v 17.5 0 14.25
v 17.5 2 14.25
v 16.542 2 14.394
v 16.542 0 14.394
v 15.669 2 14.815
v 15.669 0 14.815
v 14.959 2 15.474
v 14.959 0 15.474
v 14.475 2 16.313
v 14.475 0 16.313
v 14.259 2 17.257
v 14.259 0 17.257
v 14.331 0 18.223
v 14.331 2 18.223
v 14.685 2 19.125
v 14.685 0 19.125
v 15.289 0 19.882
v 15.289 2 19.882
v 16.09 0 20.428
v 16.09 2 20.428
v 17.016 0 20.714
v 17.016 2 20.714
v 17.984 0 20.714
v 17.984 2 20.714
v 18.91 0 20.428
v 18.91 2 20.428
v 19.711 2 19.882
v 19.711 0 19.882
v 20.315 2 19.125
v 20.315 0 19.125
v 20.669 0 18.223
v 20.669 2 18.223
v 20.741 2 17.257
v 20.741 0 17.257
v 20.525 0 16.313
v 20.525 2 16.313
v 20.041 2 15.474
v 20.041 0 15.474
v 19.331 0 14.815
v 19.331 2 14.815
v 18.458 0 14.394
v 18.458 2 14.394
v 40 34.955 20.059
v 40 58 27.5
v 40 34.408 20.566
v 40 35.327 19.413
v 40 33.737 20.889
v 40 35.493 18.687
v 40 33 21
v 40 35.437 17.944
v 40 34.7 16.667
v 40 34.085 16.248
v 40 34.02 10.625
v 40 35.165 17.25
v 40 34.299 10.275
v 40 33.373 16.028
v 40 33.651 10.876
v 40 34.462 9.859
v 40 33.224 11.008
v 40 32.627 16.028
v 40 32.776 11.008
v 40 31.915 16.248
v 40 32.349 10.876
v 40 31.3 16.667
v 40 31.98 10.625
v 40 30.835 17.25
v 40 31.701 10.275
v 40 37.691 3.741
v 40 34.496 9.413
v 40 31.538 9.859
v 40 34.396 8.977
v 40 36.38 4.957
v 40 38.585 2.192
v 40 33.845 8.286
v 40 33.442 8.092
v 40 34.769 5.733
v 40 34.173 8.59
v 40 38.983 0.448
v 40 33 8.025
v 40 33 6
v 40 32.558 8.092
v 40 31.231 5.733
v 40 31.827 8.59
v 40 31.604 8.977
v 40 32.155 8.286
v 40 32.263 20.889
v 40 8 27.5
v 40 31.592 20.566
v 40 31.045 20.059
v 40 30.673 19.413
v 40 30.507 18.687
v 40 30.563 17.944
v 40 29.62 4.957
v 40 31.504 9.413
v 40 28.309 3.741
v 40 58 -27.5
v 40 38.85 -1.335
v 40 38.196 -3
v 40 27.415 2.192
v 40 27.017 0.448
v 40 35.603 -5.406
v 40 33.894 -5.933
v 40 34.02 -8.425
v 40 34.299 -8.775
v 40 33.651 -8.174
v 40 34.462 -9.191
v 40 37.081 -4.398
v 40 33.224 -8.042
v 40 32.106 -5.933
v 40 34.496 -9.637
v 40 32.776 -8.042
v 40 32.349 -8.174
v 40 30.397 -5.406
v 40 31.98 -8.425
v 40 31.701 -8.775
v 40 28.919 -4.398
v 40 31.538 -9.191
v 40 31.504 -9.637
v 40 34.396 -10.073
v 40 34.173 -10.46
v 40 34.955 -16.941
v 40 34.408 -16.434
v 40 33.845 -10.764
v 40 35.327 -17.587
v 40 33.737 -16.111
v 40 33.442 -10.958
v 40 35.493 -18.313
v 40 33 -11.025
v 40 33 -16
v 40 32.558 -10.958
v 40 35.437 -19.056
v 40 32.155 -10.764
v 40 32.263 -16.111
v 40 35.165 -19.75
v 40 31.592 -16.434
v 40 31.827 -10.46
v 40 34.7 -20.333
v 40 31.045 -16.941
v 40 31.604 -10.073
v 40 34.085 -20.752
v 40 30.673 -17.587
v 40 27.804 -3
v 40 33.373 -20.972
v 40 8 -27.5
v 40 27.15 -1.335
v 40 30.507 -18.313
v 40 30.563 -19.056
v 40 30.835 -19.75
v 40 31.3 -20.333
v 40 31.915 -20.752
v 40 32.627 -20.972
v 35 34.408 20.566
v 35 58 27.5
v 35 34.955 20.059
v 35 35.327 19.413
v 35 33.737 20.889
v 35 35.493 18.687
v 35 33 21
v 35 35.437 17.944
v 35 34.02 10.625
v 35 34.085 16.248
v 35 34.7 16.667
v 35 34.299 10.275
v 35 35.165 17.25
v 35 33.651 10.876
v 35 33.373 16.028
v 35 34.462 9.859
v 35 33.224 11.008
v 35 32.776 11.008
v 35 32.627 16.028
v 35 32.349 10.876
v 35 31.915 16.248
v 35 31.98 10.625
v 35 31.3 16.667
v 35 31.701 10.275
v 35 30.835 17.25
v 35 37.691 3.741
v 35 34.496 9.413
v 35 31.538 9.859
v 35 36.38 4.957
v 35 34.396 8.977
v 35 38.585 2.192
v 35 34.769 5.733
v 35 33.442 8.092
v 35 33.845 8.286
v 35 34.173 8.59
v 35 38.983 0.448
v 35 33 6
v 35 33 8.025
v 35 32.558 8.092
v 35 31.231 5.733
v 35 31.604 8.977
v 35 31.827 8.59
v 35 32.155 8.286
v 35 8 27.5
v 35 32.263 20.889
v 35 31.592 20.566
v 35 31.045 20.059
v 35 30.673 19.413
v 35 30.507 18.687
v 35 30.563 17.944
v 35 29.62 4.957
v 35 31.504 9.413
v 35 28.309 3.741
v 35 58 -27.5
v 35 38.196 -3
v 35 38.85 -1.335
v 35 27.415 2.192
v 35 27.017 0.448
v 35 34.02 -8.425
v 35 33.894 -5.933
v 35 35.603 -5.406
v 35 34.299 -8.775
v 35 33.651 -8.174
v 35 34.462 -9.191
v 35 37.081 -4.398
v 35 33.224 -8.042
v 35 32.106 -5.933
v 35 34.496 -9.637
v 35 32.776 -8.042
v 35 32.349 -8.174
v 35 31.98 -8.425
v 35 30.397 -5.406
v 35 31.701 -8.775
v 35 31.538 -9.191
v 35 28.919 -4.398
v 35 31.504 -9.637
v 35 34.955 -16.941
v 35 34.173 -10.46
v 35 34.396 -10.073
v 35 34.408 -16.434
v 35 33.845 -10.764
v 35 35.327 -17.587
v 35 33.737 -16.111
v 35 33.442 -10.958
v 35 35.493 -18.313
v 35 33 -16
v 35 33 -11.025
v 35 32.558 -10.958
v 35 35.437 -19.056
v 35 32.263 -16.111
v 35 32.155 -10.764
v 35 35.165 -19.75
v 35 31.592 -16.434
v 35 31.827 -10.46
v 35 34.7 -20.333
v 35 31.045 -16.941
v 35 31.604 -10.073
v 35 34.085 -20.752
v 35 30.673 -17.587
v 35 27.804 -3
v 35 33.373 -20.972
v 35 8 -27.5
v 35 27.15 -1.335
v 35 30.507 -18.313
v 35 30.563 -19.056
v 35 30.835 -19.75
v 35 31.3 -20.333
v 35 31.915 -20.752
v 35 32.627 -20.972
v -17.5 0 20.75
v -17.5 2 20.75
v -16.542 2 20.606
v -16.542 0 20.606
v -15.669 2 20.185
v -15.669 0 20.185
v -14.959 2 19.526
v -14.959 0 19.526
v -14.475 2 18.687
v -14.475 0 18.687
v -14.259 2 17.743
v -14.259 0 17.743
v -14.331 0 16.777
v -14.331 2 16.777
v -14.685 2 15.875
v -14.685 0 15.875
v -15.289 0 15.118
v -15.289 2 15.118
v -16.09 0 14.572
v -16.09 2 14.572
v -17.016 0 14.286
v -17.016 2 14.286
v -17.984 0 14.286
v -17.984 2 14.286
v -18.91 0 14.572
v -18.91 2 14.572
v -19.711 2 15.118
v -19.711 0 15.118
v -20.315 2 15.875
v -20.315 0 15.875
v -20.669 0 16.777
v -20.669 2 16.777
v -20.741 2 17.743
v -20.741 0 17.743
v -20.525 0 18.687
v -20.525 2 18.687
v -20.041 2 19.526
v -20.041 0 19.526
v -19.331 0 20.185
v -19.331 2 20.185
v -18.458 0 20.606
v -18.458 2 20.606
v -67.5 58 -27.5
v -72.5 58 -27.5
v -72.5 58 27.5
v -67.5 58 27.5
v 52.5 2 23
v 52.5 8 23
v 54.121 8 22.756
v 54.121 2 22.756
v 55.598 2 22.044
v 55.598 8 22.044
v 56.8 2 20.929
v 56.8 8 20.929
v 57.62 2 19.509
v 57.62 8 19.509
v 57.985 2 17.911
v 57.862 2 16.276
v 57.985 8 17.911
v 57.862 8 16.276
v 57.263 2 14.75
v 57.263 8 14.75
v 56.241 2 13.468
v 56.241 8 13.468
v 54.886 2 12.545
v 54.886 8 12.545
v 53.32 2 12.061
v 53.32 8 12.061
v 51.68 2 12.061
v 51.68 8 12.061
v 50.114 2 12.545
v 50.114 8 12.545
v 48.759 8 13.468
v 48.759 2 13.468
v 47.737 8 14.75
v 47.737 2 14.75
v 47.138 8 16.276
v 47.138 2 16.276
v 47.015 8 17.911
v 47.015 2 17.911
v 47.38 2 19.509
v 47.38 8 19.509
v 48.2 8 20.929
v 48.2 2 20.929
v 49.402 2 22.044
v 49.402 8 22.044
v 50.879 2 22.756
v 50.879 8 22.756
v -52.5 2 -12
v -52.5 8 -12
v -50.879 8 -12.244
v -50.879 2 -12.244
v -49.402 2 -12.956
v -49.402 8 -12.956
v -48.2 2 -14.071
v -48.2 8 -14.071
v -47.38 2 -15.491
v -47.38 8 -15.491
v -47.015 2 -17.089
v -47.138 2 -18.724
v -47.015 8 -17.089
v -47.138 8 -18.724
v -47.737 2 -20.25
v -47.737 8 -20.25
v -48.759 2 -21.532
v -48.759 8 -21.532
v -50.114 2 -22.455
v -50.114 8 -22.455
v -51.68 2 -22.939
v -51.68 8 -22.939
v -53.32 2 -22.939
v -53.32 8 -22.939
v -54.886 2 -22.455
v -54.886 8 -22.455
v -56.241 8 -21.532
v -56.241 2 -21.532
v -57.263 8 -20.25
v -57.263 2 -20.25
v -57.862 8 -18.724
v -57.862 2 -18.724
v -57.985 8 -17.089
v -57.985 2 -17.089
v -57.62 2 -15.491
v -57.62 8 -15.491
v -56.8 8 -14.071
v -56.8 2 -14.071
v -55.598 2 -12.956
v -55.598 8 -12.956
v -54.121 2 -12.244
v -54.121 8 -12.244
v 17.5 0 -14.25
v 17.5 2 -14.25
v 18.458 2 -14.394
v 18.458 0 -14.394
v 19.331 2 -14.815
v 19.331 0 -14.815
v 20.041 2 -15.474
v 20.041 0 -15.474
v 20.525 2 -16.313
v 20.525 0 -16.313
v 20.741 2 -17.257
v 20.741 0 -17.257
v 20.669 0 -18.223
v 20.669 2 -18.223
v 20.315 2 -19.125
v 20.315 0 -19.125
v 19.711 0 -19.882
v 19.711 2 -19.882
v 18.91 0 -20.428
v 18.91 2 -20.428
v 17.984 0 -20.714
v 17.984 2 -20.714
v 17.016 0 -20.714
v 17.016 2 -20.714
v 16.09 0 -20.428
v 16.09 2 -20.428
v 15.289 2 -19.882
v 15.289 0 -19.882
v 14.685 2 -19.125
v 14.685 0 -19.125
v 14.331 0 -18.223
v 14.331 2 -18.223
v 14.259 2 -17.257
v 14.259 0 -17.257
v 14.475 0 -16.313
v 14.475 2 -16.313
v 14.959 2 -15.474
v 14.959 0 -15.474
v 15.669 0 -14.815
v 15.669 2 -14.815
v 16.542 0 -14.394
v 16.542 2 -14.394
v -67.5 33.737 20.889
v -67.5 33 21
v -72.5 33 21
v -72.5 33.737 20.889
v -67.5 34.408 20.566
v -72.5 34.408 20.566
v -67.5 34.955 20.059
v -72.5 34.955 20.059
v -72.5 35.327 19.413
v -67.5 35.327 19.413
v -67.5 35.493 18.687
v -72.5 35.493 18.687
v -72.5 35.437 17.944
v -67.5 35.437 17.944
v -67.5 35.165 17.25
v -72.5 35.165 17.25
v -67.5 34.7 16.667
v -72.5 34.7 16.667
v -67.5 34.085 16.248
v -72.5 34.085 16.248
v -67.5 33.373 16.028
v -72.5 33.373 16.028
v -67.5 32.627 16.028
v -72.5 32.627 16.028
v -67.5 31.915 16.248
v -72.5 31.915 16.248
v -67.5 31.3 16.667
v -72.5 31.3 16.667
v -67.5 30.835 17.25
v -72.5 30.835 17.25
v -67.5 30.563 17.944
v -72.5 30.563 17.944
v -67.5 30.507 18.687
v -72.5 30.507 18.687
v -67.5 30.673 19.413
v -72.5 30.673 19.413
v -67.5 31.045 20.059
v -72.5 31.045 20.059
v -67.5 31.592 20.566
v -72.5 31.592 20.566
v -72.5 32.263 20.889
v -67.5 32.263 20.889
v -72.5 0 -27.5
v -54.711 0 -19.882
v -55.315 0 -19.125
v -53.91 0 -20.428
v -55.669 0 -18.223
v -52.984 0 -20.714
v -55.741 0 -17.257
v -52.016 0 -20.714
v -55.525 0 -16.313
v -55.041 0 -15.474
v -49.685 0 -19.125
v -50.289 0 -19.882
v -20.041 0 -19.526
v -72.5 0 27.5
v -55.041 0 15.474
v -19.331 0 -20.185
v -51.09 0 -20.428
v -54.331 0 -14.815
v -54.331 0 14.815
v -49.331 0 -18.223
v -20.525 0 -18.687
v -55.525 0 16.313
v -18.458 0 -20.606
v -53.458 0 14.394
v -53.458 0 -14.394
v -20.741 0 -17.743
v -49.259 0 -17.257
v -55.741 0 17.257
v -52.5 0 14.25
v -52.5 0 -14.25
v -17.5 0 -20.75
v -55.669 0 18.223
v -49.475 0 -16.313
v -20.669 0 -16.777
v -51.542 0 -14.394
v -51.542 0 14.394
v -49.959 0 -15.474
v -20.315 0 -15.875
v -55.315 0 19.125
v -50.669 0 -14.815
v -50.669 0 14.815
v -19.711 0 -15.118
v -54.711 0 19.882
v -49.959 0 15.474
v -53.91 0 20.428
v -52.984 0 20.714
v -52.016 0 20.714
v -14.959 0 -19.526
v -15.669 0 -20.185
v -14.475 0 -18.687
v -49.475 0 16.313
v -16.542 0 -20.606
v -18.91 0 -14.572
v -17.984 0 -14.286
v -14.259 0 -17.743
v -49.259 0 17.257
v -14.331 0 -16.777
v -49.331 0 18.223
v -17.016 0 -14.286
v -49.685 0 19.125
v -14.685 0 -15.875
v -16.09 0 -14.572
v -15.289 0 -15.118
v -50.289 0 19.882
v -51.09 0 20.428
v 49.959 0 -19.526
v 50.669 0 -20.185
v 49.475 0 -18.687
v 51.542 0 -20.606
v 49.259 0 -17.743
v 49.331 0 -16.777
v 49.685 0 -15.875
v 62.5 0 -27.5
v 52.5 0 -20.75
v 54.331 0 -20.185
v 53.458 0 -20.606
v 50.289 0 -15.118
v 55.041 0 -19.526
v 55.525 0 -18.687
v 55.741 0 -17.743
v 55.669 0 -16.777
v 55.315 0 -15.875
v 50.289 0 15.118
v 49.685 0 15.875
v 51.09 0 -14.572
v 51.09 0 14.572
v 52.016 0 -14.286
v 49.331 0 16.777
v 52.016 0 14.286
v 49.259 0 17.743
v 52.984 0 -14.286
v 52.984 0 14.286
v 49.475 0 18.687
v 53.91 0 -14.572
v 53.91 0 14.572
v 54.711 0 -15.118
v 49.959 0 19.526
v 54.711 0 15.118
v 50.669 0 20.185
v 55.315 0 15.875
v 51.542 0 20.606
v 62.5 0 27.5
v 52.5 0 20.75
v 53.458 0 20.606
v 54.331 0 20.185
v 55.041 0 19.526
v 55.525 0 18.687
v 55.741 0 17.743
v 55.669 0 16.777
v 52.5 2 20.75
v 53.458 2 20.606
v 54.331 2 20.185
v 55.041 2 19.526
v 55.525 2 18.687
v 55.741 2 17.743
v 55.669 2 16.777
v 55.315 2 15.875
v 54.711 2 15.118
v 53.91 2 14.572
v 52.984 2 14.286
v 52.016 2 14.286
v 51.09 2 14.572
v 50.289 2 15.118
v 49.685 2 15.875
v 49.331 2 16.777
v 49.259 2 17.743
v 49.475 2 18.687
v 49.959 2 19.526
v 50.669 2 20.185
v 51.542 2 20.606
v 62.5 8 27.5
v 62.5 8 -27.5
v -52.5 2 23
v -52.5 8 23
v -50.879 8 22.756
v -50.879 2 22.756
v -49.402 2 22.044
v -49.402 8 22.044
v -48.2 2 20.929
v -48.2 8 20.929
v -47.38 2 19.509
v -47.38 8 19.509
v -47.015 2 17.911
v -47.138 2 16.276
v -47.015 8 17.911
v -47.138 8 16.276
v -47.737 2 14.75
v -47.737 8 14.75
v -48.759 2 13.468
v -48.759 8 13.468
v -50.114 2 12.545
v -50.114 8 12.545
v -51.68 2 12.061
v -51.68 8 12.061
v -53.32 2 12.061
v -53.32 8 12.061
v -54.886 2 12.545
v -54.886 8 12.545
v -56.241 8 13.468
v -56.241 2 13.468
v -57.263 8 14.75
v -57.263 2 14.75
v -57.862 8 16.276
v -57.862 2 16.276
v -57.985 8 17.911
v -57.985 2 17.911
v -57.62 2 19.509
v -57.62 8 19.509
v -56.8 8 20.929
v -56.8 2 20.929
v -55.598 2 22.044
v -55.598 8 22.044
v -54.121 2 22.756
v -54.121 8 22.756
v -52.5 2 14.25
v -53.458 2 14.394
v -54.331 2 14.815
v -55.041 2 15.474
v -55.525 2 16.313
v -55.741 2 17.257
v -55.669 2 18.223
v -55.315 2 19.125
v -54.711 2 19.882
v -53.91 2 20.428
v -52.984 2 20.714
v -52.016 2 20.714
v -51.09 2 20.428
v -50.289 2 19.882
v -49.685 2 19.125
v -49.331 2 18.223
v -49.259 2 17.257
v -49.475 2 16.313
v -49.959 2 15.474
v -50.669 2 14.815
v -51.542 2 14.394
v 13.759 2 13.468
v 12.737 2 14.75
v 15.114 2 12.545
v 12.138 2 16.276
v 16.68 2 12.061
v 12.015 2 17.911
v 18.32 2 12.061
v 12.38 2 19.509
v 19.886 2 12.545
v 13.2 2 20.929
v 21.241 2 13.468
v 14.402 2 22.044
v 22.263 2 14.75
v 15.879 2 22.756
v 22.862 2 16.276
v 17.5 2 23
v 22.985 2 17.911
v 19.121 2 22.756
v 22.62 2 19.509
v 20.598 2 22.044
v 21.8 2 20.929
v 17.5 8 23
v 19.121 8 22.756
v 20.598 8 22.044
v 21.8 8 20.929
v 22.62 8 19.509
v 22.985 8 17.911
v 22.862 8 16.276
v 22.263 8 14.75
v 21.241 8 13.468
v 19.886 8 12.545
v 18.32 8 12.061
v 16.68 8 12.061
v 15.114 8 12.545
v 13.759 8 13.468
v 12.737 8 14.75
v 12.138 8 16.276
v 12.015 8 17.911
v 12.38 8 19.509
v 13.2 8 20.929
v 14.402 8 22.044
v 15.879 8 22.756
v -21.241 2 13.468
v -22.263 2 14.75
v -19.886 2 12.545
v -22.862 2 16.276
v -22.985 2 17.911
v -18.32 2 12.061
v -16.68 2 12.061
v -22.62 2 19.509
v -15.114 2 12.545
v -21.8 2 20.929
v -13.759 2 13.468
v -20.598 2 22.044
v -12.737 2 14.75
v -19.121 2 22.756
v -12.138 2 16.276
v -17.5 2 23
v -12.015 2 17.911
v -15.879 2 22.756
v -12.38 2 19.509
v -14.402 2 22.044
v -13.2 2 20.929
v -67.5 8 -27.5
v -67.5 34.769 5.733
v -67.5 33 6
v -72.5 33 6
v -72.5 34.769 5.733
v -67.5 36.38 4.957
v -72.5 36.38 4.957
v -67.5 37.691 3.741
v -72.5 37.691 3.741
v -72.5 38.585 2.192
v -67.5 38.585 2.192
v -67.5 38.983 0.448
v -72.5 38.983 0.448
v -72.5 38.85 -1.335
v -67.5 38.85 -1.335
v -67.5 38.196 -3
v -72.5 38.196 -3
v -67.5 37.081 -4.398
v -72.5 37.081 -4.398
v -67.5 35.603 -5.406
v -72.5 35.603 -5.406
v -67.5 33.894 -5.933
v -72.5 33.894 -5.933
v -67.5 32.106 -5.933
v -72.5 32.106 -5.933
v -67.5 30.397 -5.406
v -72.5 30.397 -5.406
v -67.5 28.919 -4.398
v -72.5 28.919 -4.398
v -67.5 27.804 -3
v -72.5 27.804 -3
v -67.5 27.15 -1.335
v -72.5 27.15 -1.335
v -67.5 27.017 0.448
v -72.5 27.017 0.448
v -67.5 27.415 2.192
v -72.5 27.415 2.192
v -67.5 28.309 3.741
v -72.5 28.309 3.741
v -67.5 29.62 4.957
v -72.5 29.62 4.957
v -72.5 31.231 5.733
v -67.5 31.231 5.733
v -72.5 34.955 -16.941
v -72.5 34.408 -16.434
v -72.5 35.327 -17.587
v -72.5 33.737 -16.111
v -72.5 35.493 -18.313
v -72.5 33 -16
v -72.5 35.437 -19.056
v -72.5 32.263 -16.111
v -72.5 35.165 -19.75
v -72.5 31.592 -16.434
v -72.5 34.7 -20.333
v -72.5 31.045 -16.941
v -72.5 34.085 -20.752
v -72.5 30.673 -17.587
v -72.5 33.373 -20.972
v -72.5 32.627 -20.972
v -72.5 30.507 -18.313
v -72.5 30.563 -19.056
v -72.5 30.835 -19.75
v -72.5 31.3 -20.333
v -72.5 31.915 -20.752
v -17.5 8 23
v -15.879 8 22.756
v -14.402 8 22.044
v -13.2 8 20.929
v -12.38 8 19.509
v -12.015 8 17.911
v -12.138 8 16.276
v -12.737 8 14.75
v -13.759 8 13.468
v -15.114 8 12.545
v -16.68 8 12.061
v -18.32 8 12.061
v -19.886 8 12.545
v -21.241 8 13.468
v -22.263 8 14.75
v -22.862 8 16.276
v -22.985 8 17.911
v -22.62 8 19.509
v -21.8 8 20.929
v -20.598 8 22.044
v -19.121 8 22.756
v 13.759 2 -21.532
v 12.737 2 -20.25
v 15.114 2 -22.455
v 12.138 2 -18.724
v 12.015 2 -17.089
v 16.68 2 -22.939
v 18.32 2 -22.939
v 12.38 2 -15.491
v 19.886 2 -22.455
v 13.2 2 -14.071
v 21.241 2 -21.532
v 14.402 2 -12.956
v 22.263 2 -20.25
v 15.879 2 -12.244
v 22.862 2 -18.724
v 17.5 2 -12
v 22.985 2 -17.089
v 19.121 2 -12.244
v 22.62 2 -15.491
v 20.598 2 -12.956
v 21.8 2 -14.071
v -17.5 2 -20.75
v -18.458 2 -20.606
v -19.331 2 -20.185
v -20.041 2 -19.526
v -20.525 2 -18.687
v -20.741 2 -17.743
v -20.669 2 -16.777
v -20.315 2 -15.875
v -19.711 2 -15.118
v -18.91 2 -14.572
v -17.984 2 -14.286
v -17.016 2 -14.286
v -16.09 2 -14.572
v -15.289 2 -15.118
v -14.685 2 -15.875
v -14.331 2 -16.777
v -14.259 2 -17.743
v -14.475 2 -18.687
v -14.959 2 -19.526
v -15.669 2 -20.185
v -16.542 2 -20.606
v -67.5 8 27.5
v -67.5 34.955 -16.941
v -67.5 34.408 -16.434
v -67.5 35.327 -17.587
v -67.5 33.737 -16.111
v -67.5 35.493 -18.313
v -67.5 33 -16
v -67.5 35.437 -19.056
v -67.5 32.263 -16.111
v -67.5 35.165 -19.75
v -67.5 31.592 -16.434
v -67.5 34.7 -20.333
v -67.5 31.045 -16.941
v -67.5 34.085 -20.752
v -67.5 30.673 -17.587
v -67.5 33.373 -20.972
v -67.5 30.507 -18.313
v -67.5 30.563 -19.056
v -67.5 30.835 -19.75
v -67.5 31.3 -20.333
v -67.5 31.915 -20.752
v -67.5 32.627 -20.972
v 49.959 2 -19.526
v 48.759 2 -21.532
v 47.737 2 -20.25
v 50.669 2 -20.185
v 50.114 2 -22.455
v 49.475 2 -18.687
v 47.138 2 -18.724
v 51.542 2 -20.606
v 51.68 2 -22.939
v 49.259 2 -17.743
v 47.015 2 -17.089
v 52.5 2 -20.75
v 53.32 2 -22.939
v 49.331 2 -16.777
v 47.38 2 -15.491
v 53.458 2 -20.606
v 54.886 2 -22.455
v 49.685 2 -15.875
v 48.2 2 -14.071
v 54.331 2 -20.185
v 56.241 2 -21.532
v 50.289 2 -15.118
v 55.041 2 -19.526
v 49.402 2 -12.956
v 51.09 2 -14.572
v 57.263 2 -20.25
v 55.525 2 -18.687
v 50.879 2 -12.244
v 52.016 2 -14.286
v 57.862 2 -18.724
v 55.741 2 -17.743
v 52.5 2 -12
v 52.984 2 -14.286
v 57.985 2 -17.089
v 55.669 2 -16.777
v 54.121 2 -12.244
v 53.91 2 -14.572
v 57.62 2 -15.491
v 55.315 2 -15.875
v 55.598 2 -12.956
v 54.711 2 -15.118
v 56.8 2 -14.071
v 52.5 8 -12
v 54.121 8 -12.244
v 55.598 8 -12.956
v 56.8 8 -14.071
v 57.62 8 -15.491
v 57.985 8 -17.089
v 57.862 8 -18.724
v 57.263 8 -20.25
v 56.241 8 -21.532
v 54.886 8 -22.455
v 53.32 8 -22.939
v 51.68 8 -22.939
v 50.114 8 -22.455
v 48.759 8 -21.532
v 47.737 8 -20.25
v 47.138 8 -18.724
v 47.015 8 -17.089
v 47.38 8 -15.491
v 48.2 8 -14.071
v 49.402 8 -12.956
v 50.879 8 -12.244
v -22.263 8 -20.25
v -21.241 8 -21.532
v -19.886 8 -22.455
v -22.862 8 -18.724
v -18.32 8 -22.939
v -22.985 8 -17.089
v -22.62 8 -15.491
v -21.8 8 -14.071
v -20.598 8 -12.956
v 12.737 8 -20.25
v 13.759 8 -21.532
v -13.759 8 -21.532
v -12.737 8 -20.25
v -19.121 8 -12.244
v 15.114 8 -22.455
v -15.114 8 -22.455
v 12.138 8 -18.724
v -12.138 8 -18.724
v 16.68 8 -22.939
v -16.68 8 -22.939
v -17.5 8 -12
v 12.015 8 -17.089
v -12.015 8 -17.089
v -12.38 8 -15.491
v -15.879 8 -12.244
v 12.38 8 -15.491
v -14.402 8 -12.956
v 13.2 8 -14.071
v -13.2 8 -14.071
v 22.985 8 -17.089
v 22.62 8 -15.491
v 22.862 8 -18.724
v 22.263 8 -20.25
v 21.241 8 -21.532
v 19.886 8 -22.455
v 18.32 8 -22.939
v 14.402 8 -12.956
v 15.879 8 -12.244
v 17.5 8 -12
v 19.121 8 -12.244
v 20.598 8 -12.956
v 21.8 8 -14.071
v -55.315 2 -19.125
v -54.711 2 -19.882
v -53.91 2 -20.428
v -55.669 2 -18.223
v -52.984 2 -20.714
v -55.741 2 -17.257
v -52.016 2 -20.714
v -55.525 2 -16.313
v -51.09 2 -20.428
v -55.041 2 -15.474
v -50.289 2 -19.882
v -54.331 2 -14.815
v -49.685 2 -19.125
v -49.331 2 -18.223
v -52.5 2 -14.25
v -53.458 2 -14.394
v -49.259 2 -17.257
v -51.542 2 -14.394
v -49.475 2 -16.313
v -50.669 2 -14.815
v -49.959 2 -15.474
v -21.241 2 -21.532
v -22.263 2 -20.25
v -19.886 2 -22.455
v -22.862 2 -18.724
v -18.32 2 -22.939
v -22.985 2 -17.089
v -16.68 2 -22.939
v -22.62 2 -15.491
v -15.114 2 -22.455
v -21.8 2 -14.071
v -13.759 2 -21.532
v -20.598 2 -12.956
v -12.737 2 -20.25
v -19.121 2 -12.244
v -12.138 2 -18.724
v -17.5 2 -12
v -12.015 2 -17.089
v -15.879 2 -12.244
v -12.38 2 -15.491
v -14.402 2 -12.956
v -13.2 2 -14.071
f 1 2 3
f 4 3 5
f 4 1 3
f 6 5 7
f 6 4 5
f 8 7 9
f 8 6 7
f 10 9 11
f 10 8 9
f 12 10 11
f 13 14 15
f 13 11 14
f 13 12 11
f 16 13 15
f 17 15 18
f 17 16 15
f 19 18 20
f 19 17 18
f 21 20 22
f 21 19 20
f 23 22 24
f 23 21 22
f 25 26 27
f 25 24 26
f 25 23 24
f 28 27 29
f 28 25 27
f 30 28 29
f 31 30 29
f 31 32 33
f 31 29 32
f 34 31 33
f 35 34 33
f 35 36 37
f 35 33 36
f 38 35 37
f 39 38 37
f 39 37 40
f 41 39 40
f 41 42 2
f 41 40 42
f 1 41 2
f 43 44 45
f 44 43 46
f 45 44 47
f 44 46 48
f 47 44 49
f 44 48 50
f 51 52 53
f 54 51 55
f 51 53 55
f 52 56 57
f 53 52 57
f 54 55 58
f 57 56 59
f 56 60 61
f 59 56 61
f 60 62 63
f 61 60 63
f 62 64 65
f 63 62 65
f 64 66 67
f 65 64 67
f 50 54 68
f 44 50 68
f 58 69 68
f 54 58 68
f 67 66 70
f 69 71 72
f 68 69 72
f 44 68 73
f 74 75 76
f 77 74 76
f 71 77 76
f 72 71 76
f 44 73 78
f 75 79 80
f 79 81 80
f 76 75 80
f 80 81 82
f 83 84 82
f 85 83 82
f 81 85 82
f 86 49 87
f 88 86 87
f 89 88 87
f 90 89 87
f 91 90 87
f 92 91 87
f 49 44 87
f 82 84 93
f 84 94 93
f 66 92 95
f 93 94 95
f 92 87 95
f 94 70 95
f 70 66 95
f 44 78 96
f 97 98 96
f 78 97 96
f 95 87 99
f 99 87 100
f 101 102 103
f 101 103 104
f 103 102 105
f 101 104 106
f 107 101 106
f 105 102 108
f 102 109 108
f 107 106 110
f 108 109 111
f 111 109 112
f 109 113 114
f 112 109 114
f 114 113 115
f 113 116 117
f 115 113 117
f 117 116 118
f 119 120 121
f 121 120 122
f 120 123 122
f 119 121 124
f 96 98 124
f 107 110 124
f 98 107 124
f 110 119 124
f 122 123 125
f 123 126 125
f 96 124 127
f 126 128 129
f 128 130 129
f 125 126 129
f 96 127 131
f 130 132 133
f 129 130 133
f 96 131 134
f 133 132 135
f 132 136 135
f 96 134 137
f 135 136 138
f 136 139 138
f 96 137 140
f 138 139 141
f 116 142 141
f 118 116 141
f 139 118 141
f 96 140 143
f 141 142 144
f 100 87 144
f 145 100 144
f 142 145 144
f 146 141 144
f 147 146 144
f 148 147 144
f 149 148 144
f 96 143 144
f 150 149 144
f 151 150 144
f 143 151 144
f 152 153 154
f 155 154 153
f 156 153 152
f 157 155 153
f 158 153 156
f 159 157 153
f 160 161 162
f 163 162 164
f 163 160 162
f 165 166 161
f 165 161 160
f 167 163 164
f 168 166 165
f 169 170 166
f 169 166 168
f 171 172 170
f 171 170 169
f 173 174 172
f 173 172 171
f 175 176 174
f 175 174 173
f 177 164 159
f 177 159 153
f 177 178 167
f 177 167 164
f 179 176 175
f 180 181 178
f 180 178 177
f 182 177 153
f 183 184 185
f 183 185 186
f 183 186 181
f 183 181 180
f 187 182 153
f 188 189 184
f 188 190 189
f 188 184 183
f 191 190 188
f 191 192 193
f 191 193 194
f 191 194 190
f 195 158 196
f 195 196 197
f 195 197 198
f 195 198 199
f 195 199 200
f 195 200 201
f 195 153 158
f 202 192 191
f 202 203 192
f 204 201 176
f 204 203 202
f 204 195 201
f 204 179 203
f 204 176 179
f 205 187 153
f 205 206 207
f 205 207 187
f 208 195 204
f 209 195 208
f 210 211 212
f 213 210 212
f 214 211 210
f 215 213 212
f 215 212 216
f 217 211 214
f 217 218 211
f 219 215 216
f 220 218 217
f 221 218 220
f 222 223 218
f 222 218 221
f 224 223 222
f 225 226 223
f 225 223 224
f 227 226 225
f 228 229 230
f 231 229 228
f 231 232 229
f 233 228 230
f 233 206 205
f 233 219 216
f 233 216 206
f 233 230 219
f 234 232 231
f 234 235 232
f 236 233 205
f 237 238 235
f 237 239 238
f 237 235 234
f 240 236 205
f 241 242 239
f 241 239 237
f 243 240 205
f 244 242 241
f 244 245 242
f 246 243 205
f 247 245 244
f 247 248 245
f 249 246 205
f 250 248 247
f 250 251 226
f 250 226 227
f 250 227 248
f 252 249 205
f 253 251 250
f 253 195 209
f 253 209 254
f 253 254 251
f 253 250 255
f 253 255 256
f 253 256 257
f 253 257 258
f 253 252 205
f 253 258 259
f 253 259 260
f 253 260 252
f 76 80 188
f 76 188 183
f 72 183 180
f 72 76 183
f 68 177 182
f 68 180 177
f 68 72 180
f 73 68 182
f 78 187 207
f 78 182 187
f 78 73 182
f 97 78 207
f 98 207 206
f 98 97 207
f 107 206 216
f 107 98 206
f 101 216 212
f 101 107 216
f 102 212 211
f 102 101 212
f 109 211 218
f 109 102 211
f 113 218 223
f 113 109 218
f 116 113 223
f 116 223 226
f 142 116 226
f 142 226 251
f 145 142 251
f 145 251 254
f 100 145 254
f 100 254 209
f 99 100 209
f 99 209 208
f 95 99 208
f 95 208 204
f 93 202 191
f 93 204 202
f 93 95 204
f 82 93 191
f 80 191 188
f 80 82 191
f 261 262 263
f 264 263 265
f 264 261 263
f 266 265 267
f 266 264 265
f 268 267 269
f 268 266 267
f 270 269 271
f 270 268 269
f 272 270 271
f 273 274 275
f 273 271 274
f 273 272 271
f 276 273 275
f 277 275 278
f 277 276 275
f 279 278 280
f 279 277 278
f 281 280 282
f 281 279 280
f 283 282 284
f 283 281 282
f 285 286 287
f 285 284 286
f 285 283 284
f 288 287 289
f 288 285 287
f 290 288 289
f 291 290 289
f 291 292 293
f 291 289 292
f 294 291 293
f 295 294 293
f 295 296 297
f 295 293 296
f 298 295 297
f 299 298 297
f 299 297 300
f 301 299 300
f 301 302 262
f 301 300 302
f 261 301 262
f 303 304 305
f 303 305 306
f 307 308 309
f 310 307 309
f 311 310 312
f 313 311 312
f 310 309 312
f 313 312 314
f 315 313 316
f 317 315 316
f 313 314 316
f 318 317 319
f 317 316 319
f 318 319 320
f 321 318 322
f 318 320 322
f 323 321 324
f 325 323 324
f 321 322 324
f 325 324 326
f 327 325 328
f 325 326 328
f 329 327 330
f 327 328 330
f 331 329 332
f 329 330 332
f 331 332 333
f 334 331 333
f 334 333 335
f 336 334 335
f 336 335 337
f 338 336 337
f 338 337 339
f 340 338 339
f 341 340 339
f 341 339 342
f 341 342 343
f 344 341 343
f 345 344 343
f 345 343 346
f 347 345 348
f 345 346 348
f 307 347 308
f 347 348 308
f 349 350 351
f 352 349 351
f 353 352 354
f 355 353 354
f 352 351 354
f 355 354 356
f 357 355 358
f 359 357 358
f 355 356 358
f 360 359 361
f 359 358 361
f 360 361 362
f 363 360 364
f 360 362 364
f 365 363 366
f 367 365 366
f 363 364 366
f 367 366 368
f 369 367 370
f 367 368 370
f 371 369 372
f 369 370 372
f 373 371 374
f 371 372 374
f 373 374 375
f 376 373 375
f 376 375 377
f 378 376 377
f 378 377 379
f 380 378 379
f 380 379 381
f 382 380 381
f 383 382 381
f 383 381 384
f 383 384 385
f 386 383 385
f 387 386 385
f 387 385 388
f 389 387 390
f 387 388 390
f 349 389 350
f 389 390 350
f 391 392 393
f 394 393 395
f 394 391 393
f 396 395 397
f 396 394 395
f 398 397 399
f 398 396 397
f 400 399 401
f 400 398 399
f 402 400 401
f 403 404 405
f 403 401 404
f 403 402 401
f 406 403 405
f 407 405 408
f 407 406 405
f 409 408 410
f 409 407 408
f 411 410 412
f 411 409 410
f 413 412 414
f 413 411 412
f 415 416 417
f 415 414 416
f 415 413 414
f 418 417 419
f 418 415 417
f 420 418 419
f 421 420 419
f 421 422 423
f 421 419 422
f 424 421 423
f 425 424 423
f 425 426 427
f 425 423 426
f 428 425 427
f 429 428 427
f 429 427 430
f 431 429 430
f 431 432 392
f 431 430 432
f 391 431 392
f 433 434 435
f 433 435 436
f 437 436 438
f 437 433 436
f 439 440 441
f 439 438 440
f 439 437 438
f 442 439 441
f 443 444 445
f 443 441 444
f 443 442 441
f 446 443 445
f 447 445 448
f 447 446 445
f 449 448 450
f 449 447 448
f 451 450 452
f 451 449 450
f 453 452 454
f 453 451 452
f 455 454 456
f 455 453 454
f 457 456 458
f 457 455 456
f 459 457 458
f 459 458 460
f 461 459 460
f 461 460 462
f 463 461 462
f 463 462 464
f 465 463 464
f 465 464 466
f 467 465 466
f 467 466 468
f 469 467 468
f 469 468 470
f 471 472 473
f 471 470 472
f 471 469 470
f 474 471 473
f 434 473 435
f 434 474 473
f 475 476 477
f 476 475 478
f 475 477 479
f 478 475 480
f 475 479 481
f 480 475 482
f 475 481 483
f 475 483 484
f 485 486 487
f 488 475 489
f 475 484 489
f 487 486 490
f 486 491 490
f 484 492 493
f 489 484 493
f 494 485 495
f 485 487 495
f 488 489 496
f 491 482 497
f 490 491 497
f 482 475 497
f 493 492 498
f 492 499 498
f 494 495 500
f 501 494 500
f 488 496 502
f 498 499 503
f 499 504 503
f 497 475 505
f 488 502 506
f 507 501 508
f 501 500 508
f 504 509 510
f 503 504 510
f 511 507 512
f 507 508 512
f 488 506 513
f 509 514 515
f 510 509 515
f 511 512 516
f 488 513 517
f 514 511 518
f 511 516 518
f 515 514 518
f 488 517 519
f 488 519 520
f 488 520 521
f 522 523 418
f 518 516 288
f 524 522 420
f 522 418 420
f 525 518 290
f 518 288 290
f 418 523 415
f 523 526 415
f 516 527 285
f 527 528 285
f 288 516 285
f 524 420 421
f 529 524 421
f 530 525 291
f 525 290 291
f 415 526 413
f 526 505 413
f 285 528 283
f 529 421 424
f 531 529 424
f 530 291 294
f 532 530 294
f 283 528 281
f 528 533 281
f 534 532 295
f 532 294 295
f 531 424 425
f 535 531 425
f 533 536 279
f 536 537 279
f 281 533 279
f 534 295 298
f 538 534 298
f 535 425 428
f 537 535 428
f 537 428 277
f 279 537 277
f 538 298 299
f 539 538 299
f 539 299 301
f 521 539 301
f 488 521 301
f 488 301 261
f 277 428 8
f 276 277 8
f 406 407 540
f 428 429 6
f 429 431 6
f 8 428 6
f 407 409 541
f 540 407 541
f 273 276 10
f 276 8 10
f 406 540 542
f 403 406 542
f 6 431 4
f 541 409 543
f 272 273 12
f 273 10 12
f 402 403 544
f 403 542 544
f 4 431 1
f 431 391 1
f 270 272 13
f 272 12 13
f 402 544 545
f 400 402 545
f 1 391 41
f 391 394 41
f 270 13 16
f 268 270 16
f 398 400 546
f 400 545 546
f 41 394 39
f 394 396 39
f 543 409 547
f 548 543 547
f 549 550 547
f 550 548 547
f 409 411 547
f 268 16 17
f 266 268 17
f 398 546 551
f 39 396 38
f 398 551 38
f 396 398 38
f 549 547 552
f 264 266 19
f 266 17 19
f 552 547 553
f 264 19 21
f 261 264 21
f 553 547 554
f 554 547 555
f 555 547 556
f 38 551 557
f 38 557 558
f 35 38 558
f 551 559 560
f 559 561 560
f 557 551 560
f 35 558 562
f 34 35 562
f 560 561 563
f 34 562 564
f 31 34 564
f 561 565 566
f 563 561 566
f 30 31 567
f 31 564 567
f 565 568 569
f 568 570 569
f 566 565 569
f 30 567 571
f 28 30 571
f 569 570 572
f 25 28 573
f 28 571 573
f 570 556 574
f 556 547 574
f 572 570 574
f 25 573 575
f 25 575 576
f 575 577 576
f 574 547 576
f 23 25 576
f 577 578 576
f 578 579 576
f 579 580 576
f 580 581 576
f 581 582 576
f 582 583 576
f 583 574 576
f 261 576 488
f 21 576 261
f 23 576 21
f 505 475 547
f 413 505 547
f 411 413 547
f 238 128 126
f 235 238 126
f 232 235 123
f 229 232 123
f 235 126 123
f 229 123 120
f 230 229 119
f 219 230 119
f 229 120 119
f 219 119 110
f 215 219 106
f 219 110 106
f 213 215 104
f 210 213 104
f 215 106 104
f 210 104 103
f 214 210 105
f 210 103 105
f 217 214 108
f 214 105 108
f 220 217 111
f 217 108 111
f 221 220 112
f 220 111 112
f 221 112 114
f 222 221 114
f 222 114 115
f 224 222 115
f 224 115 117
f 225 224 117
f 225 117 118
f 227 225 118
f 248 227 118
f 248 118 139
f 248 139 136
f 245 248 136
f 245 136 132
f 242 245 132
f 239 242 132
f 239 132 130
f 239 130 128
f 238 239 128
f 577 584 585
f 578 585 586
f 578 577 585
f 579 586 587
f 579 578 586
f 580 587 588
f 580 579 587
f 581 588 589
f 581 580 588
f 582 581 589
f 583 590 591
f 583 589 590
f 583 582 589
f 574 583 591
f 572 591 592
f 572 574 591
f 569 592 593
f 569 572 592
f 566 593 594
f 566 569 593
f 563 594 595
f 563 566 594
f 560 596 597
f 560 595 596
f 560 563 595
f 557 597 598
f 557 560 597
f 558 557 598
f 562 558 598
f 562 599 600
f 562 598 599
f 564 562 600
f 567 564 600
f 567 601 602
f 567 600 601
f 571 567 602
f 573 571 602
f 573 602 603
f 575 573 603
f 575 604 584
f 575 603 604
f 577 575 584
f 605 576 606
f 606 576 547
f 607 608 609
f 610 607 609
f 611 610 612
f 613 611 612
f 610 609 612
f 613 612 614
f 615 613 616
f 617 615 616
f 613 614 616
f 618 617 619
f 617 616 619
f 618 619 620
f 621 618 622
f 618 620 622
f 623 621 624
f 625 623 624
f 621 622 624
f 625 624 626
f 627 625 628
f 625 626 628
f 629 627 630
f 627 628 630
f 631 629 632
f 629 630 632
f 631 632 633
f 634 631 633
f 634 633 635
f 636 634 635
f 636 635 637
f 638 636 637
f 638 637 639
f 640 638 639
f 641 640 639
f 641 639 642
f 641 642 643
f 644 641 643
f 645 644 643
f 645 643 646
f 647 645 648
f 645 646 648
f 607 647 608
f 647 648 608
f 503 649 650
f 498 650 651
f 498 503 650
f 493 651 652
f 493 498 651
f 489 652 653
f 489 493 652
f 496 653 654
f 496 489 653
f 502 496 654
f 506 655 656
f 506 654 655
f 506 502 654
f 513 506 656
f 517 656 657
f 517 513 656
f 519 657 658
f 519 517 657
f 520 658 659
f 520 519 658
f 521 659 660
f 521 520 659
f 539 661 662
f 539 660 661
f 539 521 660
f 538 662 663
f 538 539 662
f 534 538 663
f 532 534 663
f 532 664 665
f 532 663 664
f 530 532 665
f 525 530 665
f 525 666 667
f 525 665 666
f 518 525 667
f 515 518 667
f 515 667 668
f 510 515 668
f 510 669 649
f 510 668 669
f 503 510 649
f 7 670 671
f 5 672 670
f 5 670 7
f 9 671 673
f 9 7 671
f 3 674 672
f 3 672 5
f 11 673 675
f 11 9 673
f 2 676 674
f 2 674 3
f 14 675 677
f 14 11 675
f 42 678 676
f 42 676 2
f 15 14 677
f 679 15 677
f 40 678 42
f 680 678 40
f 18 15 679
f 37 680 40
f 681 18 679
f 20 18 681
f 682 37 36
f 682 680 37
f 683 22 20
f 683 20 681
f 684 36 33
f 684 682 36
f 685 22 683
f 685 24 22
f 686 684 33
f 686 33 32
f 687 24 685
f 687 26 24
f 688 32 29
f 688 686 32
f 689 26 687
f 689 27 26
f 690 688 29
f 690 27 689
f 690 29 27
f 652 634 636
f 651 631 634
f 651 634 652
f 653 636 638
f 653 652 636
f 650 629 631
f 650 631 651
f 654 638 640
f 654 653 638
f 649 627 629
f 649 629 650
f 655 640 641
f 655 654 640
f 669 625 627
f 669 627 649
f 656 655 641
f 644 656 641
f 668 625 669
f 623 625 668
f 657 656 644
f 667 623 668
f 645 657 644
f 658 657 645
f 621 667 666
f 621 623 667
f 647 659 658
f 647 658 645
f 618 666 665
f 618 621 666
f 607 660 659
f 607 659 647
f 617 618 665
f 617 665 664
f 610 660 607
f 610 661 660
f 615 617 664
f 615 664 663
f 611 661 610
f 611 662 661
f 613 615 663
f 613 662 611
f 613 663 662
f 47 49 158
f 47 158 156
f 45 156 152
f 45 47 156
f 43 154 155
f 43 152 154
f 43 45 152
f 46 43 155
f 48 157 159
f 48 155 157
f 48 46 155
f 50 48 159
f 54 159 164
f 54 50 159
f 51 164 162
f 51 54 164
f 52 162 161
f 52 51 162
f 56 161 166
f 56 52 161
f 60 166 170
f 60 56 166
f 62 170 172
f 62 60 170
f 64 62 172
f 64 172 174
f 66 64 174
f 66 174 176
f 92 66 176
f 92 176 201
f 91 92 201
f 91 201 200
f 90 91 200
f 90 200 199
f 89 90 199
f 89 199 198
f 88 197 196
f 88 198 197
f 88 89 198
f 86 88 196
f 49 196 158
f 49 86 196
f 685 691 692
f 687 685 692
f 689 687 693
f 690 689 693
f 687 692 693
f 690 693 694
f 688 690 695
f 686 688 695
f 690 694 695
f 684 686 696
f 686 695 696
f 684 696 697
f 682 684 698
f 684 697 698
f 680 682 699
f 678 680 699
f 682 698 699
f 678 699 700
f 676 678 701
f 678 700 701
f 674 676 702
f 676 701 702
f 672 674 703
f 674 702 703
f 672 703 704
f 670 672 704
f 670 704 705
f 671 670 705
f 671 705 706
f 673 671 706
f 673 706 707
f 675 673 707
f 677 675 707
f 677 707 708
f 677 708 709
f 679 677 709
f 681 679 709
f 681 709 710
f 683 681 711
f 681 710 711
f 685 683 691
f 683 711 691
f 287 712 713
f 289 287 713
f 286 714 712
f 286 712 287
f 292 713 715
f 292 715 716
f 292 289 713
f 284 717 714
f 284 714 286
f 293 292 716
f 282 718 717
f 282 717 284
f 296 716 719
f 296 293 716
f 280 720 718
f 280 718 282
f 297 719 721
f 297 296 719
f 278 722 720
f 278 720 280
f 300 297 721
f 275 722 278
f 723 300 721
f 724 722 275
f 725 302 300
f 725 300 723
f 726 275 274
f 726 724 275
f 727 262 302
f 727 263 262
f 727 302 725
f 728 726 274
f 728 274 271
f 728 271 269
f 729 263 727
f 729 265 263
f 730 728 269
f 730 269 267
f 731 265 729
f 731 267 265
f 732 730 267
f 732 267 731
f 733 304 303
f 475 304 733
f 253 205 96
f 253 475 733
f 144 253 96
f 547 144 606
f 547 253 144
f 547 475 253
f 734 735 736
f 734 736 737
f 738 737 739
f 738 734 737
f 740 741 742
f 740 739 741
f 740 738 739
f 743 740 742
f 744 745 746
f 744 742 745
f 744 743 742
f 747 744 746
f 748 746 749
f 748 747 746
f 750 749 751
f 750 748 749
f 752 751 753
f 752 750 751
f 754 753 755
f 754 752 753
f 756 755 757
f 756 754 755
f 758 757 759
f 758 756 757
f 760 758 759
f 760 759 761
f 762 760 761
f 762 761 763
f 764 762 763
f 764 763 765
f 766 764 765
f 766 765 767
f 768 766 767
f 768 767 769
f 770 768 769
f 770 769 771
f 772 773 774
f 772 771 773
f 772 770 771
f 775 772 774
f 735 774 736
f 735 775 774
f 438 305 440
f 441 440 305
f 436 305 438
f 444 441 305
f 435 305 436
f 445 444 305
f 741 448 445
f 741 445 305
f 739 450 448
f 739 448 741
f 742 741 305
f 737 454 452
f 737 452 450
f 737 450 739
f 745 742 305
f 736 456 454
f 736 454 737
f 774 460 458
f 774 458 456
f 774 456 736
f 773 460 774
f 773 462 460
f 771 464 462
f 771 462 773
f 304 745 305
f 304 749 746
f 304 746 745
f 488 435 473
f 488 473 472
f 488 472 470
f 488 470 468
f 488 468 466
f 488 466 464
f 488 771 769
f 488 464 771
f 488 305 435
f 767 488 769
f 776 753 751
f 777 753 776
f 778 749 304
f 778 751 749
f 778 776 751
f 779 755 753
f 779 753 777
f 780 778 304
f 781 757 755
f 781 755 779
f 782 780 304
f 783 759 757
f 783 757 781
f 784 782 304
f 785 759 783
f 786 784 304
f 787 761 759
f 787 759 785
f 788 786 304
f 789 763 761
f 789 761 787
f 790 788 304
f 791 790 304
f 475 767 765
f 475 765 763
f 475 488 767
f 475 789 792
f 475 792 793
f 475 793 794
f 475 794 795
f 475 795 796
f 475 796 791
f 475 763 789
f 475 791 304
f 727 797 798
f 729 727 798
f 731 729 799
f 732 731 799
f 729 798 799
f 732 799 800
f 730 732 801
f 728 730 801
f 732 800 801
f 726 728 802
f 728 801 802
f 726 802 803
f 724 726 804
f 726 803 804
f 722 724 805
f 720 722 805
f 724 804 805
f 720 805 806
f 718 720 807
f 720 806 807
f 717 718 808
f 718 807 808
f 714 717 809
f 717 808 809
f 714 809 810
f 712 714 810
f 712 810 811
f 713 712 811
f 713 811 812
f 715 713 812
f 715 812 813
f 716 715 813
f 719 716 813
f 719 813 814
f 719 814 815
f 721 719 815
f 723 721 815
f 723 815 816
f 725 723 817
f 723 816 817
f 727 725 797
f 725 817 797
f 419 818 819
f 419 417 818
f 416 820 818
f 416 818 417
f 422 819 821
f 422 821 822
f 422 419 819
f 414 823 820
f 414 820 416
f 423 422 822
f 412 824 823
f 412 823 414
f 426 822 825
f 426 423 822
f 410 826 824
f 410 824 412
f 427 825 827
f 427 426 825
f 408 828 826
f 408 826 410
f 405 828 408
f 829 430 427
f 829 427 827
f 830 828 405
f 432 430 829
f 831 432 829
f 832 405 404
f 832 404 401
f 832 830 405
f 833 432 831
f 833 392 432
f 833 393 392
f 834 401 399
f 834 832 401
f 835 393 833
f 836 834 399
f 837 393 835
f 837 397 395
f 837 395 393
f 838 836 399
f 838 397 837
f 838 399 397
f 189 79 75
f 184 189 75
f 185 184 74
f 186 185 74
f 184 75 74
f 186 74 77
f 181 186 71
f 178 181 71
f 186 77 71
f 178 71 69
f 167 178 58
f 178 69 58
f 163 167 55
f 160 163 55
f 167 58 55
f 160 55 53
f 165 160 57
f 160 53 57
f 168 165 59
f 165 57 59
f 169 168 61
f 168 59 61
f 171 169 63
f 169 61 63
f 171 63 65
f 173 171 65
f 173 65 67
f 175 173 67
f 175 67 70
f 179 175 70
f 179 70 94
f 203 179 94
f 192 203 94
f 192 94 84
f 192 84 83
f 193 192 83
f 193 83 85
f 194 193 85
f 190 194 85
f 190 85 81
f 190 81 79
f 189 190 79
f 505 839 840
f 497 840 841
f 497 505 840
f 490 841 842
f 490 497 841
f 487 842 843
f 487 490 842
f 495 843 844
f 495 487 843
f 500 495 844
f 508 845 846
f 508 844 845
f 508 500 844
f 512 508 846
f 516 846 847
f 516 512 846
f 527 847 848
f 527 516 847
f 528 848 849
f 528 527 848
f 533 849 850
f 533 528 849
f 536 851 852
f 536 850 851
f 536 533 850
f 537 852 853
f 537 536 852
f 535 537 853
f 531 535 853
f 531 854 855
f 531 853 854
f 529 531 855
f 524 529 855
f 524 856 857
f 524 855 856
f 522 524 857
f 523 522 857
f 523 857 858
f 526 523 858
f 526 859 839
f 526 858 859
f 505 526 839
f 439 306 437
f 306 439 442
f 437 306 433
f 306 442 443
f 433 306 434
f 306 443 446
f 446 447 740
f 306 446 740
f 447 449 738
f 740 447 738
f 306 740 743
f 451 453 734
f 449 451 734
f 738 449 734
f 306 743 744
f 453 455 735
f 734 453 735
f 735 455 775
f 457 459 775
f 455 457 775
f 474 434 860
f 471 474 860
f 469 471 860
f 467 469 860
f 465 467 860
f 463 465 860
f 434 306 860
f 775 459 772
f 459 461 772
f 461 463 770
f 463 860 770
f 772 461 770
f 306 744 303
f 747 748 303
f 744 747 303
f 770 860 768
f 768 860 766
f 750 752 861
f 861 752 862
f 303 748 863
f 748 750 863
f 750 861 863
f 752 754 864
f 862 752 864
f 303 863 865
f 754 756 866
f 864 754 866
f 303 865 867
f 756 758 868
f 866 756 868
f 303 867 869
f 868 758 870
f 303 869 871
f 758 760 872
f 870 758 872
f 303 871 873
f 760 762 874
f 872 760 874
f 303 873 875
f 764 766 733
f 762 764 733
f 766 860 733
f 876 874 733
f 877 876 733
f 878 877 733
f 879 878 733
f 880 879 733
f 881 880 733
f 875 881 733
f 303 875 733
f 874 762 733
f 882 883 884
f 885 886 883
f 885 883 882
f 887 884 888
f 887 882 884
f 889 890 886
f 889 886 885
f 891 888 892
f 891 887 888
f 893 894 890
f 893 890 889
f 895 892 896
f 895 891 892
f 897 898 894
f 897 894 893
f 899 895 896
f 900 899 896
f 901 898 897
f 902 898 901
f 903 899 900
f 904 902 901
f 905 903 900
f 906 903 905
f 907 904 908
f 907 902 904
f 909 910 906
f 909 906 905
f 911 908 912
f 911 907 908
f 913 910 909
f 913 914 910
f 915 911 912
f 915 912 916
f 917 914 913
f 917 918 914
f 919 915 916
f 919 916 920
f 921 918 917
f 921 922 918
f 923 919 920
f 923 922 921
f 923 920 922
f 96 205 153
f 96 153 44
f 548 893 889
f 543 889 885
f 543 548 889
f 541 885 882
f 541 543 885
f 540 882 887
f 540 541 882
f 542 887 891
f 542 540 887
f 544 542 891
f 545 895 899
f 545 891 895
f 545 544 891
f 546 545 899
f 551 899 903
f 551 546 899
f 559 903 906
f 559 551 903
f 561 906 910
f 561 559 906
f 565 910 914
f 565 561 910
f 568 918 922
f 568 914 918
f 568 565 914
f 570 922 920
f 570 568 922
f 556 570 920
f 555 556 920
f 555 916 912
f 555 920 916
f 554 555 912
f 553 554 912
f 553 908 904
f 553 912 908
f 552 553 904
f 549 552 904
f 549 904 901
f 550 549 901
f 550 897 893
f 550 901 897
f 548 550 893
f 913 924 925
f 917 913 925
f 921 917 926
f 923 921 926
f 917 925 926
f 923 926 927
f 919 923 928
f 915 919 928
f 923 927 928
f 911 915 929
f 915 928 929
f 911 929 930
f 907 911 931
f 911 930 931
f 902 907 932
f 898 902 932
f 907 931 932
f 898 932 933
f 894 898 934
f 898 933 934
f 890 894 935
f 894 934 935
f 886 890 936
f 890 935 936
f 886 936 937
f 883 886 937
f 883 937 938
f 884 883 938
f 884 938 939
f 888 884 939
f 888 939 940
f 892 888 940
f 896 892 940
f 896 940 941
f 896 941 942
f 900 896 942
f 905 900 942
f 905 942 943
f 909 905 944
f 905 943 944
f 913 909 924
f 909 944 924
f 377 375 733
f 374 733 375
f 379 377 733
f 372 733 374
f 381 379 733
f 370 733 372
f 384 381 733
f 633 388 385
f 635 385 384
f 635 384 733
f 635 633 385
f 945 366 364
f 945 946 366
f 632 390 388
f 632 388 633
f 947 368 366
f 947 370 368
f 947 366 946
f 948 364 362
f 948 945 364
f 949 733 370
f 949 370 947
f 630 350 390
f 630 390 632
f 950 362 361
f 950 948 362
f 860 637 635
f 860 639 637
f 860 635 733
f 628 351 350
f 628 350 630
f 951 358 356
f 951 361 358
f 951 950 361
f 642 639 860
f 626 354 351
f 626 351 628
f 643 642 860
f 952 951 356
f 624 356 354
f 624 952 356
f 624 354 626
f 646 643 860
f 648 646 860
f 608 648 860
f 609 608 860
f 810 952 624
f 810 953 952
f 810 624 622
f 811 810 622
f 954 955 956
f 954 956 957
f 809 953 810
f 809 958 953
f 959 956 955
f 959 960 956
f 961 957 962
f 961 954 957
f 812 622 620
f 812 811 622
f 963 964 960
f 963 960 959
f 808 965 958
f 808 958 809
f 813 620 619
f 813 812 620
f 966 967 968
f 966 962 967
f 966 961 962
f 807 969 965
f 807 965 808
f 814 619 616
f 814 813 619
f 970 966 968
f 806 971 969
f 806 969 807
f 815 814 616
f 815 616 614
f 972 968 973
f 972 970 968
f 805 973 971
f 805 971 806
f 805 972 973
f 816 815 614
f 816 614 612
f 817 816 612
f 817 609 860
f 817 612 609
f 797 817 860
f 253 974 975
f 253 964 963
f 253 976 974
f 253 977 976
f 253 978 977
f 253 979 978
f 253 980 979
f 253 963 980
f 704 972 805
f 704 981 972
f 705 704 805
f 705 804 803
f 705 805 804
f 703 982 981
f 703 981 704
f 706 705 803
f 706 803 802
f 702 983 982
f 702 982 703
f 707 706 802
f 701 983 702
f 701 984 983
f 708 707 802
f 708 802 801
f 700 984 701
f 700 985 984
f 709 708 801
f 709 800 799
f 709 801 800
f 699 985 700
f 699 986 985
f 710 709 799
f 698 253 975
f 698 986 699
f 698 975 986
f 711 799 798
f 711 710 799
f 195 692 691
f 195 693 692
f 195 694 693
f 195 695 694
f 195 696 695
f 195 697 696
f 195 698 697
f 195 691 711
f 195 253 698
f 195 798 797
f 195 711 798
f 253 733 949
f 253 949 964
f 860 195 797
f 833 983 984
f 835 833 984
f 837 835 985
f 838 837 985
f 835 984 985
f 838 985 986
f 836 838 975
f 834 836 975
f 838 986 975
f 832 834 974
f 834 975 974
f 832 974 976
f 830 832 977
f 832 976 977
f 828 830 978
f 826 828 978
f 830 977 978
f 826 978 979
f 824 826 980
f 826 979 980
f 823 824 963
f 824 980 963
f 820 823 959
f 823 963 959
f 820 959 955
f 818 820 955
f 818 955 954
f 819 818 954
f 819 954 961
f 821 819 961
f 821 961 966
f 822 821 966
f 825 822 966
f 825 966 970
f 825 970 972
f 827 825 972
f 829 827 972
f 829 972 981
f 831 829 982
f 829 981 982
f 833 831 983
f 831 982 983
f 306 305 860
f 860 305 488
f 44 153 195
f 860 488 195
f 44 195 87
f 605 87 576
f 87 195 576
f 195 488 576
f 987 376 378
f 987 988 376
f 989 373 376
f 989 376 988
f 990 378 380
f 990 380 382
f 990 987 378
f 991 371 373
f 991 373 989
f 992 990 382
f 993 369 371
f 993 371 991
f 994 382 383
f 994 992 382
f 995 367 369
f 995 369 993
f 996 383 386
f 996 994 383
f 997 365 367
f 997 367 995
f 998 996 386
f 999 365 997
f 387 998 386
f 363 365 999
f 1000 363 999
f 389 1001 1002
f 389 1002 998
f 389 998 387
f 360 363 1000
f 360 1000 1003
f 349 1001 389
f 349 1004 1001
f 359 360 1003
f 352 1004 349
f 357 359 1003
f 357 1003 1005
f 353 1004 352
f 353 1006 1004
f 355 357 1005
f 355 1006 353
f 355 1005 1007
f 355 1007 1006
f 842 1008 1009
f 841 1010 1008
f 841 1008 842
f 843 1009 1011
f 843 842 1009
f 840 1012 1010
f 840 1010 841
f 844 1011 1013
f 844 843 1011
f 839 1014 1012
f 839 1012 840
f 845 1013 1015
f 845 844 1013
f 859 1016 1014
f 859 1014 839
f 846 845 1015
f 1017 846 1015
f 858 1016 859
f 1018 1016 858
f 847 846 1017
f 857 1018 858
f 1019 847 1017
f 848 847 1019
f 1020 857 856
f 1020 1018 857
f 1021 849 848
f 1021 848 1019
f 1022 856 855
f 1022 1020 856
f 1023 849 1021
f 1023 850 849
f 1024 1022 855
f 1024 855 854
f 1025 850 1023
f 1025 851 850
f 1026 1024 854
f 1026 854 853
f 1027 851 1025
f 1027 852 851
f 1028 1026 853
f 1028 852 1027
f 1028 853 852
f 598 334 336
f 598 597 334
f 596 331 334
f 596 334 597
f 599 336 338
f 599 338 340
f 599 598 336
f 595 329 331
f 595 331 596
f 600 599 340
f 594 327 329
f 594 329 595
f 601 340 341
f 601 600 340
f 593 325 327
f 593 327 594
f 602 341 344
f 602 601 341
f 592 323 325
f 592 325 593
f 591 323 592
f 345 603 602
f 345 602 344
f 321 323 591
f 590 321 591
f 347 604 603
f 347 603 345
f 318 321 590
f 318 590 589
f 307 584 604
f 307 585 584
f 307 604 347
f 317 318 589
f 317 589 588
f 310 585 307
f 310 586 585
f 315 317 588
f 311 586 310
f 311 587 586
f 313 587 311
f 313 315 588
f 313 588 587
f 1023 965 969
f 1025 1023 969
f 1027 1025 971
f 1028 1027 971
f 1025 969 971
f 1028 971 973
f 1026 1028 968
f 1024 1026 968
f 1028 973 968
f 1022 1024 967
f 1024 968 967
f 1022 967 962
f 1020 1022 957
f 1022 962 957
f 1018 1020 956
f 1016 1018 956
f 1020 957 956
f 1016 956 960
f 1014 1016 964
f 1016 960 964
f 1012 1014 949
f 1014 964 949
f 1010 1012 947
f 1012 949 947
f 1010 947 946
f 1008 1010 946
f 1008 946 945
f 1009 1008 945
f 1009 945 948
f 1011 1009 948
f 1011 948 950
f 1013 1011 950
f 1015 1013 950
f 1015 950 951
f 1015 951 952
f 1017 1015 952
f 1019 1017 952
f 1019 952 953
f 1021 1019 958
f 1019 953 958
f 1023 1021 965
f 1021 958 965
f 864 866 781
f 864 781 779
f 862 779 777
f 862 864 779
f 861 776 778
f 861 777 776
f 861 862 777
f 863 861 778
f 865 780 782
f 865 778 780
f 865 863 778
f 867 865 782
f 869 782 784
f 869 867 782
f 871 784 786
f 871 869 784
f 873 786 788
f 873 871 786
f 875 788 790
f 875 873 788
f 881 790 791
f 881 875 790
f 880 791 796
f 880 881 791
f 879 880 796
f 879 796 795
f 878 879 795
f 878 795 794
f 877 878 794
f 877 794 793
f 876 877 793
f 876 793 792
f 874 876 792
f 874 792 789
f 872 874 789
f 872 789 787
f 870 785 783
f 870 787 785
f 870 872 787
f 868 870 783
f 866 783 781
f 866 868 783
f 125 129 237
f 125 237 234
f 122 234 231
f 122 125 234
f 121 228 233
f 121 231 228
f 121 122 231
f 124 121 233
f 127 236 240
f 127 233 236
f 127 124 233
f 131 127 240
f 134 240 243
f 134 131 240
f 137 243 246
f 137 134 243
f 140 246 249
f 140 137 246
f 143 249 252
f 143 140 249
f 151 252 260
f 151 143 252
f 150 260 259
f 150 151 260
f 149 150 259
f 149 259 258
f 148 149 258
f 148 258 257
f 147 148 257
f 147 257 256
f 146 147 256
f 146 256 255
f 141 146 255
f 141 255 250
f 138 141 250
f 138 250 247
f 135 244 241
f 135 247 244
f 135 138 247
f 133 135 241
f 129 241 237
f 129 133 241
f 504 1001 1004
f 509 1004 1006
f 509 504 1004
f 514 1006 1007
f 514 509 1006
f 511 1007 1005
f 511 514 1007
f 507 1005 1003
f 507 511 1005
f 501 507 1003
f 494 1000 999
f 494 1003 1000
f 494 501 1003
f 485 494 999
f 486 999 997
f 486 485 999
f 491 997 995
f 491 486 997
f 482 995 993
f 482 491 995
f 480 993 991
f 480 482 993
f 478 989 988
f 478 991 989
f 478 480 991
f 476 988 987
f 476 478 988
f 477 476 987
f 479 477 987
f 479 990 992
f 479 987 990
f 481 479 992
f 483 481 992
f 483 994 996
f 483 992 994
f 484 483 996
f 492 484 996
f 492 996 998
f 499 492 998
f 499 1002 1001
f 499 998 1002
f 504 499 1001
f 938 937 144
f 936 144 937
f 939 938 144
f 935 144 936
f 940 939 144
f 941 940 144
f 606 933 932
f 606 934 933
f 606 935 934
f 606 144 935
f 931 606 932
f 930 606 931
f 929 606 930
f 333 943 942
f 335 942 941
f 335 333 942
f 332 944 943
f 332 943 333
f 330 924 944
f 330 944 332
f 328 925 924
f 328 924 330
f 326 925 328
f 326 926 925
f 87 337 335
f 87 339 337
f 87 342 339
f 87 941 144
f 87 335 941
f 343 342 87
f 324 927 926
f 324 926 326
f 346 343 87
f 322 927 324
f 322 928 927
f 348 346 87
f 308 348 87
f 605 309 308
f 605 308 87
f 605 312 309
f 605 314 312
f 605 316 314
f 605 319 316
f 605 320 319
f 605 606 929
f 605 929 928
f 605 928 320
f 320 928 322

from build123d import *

# Parameters (mm, degrees)
SKETCH1_W               = 125
SKETCH1_H               = 55
SKETCH1_R               = 3.25
BOSS_EXTRUDE1_DEPTH     = 8
SKETCH5_R               = 5.5
CUT_EXTRUDE1_DEPTH      = 6
SKETCH3_W               = 55
SKETCH3_H               = 8
BOSS_EXTRUDE3_DEPTH     = 10
SKETCH4_W               = 5
SKETCH4_H               = 55
BOSS_EXTRUDE4_DEPTH     = 50
CUT_EXTRUDE2_DEPTH      = 150.483276657
CUT_EXTRUDE2_DEPTH_BACK = 150.483276657
SKETCH6_R               = 6
SKETCH6_R_2             = 2.5
SKETCH8_R               = 1.5
CUT_EXTRUDE3_DEPTH      = 10


with BuildPart() as part:
    # Sketch1 → Boss-Extrude1 (new body)
    with BuildSketch(Plane(origin=(0, 0, 0), x_dir=(1, 0, 0), z_dir=(0, 1, 0))):
        Rectangle(SKETCH1_W, SKETCH1_H)
        with Locations(Location((-52.5, 17.5, 0), (0, 0, 270))):
            Circle(SKETCH1_R, mode=Mode.SUBTRACT)
        with Locations(Location((-52.5, -17.5, 0), (0, 0, 90))):
            Circle(SKETCH1_R, mode=Mode.SUBTRACT)
        with Locations(Location((-17.5, -17.5, 0), (0, 0, 270))):
            Circle(SKETCH1_R, mode=Mode.SUBTRACT)
        with Locations(Location((-17.5, 17.5, 0), (0, 0, 90))):
            Circle(SKETCH1_R, mode=Mode.SUBTRACT)
        with Locations(Location((52.5, -17.5, 0), (0, 0, 270))):
            Circle(SKETCH1_R, mode=Mode.SUBTRACT)
        with Locations(Location((17.5, -17.5, 0), (0, 0, 90))):
            Circle(SKETCH1_R, mode=Mode.SUBTRACT)
        with Locations(Location((17.5, 17.5, 0), (0, 0, 270))):
            Circle(SKETCH1_R, mode=Mode.SUBTRACT)
        with Locations(Location((52.5, 17.5, 0), (0, 0, 90))):
            Circle(SKETCH1_R, mode=Mode.SUBTRACT)
    extrude(amount=BOSS_EXTRUDE1_DEPTH)

    # Sketch5 → Cut-Extrude1 (cut)
    with BuildSketch(Plane(origin=(0, 8, 0), x_dir=(1, 0, 0), z_dir=(0, 1, 0))):
        with Locations(Location((-52.5, 17.5, 0), (0, 0, 270))):
            Circle(SKETCH5_R)
        with Locations(Location((-17.5, 17.5, 0), (0, 0, 270))):
            Circle(SKETCH5_R)
        with Locations(Location((17.5, 17.5, 0), (0, 0, 270))):
            Circle(SKETCH5_R)
        with Locations(Location((52.5, 17.5, 0), (0, 0, 270))):
            Circle(SKETCH5_R)
        with Locations(Location((52.5, -17.5, 0), (0, 0, 270))):
            Circle(SKETCH5_R)
        with Locations(Location((17.5, -17.5, 0), (0, 0, 270))):
            Circle(SKETCH5_R)
        with Locations(Location((-17.5, -17.5, 0), (0, 0, 270))):
            Circle(SKETCH5_R)
        with Locations(Location((-52.5, -17.5, 0), (0, 0, 270))):
            Circle(SKETCH5_R)
    extrude(amount=-CUT_EXTRUDE1_DEPTH, mode=Mode.SUBTRACT)

    # Sketch3 → Boss-Extrude3 (add)
    with BuildSketch(Plane.ZY.offset(62.5)):
        with Locations((0, 4)):
            Rectangle(SKETCH3_W, SKETCH3_H)
    extrude(amount=BOSS_EXTRUDE3_DEPTH)

    # Sketch4 → Boss-Extrude4 (add)
    with BuildSketch(Plane(origin=(0, 8, 0), x_dir=(1, 0, 0), z_dir=(0, 1, 0))):
        with Locations((-70, 0)):
            Rectangle(SKETCH4_W, SKETCH4_H)
        with Locations((37.5, 0)):
            Rectangle(SKETCH4_W, SKETCH4_H)
    extrude(amount=BOSS_EXTRUDE4_DEPTH)

    # Sketch6 → Cut-Extrude2 (cut, two sides: drawn at the far end of the back side and taken through both)
    with BuildSketch(Plane.ZY.offset(72.5).offset(-CUT_EXTRUDE2_DEPTH_BACK)):
        with Locations((0, 33)):
            Circle(SKETCH6_R)
        with Locations((-18.5, 33)):
            Circle(SKETCH6_R_2)
        with Locations((18.5, 33)):
            Circle(SKETCH6_R_2)
    extrude(amount=CUT_EXTRUDE2_DEPTH + CUT_EXTRUDE2_DEPTH_BACK, mode=Mode.SUBTRACT)

    # Sketch8 → Cut-Extrude3 (cut)
    with BuildSketch(Plane(origin=(40, 0, 0), x_dir=(0, 0, -1), z_dir=(1, 0, 0))):
        with Locations((9.525, 33)):
            Circle(SKETCH8_R)
        with Locations((-9.525, 33)):
            Circle(SKETCH8_R)
    extrude(amount=-CUT_EXTRUDE3_DEPTH, mode=Mode.SUBTRACT)


solid = part.part
